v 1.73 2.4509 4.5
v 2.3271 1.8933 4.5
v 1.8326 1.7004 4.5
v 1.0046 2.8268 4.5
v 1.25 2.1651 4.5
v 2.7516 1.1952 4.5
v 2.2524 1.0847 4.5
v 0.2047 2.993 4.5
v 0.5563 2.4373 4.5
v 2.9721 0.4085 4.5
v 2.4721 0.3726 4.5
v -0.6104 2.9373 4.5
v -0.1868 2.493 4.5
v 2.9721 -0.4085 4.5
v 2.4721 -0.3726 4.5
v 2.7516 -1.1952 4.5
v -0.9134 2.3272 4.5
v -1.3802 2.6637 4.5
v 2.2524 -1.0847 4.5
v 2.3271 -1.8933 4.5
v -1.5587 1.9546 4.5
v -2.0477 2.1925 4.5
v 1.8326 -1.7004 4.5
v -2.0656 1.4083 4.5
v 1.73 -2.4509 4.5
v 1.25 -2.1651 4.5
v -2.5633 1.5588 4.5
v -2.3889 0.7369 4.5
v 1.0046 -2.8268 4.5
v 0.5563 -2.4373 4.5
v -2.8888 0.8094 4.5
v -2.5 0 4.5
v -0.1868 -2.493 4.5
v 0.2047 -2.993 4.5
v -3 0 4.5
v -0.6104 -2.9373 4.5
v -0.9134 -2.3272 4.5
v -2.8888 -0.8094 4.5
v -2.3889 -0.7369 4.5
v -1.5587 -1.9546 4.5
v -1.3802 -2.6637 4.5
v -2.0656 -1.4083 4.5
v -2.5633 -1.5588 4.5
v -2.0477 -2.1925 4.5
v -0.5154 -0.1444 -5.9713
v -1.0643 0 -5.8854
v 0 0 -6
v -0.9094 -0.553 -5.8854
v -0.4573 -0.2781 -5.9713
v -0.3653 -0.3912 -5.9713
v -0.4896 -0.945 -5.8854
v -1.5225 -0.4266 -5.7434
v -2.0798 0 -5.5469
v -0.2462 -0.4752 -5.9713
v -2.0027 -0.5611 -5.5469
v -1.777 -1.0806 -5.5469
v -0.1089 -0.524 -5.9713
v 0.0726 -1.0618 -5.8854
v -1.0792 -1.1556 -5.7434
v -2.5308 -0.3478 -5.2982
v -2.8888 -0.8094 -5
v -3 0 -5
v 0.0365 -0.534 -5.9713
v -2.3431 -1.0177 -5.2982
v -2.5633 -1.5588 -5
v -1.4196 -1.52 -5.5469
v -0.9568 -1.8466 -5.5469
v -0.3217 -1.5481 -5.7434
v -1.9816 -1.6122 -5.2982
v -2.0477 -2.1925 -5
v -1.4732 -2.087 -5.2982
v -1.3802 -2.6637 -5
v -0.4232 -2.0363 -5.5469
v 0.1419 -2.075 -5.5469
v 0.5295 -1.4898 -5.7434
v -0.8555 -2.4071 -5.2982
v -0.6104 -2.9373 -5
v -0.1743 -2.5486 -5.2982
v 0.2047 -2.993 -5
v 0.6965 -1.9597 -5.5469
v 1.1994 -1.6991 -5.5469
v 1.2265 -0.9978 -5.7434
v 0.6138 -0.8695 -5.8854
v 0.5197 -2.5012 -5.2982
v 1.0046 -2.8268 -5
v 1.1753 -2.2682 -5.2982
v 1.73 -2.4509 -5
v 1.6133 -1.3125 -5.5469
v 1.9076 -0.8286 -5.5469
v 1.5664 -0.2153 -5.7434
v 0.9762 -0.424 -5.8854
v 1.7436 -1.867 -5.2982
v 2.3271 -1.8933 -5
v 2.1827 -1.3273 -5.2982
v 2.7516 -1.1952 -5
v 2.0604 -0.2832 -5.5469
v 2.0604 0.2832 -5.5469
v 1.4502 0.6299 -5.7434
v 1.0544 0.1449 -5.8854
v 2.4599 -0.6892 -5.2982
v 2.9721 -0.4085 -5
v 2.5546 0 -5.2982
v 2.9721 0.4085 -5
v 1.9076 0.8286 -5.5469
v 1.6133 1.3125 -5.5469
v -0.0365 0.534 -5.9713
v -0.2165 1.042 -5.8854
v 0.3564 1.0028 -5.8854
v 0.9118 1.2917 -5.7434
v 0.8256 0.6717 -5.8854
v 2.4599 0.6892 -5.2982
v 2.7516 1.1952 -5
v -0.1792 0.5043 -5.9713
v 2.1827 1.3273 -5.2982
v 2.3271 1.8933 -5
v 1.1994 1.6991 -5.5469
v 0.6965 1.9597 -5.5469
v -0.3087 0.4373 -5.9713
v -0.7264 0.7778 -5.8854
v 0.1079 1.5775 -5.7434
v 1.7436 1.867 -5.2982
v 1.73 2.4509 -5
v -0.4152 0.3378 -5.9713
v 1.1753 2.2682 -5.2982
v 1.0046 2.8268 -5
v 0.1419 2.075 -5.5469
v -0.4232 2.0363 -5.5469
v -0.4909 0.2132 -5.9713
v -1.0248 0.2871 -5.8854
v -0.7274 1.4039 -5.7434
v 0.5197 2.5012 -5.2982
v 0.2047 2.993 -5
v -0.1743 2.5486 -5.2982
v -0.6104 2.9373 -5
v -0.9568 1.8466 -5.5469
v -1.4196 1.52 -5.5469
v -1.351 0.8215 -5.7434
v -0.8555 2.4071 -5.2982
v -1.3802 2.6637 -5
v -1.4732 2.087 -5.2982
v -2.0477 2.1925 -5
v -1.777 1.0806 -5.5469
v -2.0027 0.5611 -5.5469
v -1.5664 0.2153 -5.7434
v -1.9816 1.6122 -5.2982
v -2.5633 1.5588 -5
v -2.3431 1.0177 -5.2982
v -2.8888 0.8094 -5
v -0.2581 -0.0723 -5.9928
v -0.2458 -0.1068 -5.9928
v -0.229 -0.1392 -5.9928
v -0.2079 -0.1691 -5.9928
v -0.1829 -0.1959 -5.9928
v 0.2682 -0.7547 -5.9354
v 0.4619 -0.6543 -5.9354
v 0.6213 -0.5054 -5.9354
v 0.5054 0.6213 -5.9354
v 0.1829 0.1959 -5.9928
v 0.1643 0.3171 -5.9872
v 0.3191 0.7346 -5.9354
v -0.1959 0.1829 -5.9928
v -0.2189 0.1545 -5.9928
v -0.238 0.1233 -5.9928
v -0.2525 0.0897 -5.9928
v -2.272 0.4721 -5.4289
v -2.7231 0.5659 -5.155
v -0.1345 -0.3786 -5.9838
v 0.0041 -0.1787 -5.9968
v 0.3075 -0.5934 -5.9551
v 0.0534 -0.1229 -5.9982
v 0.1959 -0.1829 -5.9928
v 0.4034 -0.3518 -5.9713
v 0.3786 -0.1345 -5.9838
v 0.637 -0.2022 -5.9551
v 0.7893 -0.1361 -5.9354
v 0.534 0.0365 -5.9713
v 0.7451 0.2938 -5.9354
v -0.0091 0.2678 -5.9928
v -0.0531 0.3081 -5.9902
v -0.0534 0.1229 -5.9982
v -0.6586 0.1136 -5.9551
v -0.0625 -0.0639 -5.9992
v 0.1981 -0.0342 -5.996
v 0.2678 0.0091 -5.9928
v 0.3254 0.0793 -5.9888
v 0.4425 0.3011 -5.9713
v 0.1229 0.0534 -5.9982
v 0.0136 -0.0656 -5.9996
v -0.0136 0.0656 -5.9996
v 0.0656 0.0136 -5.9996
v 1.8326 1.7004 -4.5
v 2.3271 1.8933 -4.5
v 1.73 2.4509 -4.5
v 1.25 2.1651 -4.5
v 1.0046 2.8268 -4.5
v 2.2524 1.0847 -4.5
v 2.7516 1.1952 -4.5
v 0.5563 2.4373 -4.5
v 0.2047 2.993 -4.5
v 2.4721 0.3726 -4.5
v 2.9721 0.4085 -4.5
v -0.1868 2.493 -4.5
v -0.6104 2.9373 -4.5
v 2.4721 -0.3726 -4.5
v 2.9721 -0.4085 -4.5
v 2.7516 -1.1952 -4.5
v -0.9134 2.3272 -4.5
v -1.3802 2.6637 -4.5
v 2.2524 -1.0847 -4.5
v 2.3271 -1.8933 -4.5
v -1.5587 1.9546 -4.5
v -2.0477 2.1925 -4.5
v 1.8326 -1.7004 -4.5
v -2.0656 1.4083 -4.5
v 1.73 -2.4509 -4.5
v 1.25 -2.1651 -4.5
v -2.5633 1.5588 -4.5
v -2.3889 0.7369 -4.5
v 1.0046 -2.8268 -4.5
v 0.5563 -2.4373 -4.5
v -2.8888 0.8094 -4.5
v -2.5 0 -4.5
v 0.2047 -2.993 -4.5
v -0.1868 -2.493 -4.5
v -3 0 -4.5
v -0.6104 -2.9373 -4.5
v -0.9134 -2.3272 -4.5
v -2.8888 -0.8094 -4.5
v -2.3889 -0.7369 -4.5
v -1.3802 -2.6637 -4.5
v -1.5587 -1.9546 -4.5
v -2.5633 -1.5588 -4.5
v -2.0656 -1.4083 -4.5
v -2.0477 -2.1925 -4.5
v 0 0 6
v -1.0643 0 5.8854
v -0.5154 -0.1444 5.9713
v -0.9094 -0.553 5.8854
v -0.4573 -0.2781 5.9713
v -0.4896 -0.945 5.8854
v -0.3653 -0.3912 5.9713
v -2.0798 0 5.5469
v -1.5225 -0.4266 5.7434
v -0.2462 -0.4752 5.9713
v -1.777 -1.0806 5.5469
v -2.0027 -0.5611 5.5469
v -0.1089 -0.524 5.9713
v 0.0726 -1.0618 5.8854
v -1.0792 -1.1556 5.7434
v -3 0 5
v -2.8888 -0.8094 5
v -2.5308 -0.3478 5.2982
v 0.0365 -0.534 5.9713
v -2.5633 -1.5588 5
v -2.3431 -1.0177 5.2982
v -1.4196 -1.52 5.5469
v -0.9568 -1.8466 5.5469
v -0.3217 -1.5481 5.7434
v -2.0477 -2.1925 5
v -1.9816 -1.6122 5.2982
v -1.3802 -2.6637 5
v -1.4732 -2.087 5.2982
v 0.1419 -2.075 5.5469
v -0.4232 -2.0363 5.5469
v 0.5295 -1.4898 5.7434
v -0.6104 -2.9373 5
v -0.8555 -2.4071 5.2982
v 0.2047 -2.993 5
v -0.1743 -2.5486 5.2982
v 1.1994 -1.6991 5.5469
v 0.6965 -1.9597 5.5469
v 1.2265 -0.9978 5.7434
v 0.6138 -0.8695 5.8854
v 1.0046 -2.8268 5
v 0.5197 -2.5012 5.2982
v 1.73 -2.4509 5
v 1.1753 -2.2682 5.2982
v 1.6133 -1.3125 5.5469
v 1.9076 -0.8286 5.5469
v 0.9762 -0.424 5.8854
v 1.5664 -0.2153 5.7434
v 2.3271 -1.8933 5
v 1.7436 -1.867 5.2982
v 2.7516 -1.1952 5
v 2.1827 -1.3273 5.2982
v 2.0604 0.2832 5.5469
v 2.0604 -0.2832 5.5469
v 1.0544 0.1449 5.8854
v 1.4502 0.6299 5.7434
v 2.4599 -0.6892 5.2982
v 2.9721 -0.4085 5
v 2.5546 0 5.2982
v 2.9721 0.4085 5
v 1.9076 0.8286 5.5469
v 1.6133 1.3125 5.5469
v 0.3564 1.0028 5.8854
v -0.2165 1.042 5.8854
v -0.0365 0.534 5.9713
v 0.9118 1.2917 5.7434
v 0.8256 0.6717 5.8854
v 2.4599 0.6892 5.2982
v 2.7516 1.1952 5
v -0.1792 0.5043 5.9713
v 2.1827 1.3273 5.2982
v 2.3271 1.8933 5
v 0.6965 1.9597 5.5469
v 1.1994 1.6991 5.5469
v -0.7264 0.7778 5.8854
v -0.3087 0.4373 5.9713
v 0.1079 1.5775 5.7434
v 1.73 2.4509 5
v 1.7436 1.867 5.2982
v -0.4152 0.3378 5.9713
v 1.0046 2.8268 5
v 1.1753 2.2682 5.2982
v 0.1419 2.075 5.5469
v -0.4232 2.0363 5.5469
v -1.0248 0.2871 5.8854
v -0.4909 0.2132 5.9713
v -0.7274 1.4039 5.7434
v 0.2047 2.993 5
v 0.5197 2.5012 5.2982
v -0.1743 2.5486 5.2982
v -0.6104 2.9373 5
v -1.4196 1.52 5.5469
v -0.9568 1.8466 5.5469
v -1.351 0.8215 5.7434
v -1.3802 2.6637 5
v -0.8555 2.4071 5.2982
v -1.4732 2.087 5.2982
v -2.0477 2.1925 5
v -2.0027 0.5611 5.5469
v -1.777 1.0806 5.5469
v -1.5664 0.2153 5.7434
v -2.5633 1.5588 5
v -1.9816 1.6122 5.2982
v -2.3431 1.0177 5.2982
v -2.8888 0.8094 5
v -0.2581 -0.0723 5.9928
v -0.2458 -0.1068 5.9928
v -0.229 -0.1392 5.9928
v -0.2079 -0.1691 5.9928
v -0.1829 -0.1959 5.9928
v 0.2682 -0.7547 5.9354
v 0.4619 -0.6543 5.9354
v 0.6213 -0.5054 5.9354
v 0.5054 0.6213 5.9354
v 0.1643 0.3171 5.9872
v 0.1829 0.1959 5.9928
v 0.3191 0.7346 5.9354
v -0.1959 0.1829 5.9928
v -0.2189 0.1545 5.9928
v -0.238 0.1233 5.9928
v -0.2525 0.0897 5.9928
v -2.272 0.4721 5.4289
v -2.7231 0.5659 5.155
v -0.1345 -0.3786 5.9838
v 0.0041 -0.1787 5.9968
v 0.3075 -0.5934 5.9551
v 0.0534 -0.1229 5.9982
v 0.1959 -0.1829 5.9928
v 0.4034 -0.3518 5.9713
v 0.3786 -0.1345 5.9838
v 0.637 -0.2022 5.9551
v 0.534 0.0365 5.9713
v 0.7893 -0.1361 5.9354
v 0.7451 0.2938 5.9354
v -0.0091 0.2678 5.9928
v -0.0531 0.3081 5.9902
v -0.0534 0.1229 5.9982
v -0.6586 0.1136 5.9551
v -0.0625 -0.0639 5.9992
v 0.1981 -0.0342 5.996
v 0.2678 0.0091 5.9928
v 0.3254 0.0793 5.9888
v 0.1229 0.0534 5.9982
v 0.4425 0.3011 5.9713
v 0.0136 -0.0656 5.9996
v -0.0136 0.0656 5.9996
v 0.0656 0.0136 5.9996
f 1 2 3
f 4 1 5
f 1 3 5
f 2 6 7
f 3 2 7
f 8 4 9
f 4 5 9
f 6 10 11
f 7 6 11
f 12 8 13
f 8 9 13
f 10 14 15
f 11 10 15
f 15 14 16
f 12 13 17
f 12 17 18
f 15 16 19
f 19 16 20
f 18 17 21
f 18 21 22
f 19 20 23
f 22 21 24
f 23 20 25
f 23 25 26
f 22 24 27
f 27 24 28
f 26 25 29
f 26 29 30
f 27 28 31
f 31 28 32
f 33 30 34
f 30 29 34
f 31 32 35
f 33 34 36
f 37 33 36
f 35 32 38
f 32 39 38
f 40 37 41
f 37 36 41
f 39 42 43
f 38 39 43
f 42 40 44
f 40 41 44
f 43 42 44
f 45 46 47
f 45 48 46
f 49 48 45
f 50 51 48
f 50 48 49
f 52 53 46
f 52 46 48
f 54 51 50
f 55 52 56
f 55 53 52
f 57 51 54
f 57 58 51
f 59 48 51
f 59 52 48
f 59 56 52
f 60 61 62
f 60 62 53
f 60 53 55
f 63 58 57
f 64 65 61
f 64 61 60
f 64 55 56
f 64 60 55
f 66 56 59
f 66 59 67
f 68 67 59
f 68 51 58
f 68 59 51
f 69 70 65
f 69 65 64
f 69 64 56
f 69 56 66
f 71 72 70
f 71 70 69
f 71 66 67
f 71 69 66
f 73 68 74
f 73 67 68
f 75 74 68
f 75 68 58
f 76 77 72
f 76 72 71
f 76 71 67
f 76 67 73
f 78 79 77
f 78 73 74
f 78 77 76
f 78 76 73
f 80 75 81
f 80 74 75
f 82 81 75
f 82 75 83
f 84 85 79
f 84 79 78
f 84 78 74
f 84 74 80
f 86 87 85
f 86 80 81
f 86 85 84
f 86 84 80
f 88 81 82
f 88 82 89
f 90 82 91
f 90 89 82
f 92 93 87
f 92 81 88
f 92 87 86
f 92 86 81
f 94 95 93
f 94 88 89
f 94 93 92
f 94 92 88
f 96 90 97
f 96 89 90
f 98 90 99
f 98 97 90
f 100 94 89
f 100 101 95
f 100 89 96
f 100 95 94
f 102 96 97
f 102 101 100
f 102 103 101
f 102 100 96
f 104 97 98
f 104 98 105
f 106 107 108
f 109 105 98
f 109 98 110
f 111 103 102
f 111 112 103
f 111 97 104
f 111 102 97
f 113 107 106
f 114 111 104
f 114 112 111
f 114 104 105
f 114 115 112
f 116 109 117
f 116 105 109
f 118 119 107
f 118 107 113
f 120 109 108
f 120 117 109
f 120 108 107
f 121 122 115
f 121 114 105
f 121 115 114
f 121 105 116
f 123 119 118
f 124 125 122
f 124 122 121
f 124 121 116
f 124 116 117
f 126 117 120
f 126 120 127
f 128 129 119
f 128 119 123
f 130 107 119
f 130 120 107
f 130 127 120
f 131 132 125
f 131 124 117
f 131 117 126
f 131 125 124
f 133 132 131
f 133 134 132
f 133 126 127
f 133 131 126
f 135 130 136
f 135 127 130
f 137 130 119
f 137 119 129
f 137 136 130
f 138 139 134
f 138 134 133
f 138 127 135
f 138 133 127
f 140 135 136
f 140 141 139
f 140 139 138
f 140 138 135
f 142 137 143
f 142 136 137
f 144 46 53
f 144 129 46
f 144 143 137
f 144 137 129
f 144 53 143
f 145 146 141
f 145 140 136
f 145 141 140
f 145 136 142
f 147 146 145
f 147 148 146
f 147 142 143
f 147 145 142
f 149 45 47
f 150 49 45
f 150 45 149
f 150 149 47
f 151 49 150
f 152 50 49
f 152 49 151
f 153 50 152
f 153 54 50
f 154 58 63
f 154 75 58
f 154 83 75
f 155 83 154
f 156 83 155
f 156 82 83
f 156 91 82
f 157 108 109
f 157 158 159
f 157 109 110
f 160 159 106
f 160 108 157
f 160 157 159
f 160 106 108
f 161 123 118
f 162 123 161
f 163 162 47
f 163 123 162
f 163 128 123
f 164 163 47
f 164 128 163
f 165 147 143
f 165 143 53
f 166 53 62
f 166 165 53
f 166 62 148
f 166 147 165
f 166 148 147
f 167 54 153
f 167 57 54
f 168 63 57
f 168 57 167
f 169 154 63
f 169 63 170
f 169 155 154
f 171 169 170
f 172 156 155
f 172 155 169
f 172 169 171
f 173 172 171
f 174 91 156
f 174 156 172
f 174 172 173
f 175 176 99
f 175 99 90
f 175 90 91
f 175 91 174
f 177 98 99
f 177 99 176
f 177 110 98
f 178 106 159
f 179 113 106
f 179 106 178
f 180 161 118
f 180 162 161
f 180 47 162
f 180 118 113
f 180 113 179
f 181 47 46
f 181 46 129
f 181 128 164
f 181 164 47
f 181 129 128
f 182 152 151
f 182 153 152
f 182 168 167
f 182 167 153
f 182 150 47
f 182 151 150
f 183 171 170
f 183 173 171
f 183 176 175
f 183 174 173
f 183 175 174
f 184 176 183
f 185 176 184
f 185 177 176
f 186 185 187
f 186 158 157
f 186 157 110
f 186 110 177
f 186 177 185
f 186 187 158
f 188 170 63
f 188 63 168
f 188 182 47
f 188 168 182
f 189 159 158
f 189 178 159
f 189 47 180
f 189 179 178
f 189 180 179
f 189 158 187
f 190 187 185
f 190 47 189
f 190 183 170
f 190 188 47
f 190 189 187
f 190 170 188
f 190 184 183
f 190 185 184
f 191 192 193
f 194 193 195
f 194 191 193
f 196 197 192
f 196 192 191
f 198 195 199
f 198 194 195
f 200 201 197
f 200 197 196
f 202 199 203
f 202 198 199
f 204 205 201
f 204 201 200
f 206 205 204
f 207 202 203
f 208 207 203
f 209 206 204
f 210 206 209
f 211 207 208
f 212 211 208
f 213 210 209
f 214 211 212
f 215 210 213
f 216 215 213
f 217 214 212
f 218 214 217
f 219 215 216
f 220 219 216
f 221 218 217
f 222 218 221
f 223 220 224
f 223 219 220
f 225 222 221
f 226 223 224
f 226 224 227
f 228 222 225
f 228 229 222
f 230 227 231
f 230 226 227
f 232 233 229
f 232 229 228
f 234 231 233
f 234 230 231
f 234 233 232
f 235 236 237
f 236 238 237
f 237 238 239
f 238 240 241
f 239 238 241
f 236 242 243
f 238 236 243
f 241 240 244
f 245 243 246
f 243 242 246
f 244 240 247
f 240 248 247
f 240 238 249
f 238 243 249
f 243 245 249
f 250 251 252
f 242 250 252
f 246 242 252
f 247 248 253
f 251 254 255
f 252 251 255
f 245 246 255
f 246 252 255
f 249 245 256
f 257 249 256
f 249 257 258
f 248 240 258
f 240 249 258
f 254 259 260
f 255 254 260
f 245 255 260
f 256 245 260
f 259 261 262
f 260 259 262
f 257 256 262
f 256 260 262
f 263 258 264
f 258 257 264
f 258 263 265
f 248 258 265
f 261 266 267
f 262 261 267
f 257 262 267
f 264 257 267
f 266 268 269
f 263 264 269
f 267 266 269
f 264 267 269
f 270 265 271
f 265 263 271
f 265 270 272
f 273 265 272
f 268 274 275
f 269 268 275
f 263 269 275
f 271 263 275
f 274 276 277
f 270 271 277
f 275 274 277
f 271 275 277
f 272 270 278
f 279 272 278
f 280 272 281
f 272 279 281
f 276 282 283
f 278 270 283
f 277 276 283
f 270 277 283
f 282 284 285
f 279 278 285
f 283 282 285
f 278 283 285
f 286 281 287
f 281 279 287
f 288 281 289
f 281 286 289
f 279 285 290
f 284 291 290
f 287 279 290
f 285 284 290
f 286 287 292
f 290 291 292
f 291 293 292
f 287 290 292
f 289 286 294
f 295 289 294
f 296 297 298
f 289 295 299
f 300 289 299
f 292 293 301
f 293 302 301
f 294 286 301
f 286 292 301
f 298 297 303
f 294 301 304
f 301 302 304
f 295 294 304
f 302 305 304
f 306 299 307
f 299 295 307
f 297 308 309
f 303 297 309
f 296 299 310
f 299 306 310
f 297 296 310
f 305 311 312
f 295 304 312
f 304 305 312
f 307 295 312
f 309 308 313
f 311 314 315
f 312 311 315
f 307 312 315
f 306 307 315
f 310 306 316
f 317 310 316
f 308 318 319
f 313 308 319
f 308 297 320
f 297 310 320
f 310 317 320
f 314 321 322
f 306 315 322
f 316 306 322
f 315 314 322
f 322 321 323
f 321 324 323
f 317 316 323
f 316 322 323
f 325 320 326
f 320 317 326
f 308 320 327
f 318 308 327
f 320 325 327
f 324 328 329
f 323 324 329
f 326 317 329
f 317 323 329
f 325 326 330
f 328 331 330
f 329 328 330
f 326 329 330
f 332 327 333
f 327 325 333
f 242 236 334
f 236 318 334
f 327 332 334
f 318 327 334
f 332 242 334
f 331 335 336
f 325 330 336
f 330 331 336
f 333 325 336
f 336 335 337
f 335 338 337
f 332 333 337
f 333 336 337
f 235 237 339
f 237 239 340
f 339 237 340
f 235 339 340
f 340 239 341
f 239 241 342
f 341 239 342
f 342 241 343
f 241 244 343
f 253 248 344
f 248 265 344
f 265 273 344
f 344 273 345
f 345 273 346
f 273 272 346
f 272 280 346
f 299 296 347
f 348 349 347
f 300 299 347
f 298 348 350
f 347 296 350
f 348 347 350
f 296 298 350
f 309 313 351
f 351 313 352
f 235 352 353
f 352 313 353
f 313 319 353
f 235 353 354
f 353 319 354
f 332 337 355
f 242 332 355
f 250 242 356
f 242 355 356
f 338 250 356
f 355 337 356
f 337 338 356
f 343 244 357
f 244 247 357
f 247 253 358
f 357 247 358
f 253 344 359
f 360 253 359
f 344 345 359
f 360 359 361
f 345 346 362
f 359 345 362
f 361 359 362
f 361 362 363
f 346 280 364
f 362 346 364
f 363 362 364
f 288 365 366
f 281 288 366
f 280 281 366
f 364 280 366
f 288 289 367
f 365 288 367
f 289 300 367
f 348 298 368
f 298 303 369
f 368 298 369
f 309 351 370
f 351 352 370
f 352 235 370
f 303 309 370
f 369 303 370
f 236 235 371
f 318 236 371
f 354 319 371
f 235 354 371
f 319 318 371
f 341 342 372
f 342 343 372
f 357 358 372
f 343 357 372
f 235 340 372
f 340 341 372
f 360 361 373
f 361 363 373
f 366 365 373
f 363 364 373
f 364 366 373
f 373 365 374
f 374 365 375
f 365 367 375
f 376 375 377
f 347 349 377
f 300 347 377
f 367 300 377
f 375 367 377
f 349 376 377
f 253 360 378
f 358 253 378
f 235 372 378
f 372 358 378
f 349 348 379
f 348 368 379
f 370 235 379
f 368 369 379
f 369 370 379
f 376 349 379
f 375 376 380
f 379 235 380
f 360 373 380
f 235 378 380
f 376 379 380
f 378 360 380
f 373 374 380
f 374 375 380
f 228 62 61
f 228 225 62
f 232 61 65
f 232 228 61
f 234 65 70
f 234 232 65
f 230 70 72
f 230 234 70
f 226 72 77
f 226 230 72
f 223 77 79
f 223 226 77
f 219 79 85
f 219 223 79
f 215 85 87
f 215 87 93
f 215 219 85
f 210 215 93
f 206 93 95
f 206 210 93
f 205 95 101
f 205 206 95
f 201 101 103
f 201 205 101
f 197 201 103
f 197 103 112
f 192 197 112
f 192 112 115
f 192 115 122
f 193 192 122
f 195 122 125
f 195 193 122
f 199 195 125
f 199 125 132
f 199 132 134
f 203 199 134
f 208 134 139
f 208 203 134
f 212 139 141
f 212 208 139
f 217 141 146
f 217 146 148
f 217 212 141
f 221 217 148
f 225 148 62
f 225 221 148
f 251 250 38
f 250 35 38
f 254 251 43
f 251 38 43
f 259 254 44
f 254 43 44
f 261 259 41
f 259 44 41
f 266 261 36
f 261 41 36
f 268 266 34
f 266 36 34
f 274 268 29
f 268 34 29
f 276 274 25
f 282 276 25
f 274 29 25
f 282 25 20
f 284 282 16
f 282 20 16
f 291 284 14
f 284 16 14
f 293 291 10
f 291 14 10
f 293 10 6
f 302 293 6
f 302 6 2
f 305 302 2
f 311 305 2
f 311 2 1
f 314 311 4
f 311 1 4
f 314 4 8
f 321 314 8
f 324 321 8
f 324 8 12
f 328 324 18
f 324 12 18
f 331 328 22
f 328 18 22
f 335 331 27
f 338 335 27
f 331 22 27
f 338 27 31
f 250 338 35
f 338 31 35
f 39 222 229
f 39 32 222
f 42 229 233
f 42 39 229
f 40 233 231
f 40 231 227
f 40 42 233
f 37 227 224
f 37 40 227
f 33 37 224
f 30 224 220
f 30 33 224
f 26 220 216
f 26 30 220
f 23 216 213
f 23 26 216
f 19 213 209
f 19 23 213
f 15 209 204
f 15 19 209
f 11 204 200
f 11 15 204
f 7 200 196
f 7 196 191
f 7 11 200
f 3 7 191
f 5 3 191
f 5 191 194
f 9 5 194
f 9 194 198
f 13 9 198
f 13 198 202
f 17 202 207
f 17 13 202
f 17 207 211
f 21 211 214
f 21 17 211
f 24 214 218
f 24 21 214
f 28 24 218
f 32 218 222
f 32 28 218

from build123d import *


with BuildPart() as f1:
    # F0 (on Front) → F1 (revolve)
    with BuildSketch(Plane.XZ):
        Polygon((-2.5, 0), (0, 0), (0, 5), (-3, 5), (-3, 4.5), (-2.5, 4.5), align=None)
        with BuildLine():
            Line((-3, 5), (0, 5))
            Line((0, 5), (0, 6))
            ThreePointArc((0, 6), (-1.581139, 5.743416), (-3, 5))
        make_face()
    revolve(axis=Axis((0, 0, 2.5), (0, 0, 1)))

    # F2: F1 across face


with BuildPart() as f1_1:
    add(f1.part)
    add(f1.part.mirror(Plane(origin=(0, 0, 0), x_dir=(1, 0, 0), z_dir=(0, 0, -1))))


solid = f1_1.part
